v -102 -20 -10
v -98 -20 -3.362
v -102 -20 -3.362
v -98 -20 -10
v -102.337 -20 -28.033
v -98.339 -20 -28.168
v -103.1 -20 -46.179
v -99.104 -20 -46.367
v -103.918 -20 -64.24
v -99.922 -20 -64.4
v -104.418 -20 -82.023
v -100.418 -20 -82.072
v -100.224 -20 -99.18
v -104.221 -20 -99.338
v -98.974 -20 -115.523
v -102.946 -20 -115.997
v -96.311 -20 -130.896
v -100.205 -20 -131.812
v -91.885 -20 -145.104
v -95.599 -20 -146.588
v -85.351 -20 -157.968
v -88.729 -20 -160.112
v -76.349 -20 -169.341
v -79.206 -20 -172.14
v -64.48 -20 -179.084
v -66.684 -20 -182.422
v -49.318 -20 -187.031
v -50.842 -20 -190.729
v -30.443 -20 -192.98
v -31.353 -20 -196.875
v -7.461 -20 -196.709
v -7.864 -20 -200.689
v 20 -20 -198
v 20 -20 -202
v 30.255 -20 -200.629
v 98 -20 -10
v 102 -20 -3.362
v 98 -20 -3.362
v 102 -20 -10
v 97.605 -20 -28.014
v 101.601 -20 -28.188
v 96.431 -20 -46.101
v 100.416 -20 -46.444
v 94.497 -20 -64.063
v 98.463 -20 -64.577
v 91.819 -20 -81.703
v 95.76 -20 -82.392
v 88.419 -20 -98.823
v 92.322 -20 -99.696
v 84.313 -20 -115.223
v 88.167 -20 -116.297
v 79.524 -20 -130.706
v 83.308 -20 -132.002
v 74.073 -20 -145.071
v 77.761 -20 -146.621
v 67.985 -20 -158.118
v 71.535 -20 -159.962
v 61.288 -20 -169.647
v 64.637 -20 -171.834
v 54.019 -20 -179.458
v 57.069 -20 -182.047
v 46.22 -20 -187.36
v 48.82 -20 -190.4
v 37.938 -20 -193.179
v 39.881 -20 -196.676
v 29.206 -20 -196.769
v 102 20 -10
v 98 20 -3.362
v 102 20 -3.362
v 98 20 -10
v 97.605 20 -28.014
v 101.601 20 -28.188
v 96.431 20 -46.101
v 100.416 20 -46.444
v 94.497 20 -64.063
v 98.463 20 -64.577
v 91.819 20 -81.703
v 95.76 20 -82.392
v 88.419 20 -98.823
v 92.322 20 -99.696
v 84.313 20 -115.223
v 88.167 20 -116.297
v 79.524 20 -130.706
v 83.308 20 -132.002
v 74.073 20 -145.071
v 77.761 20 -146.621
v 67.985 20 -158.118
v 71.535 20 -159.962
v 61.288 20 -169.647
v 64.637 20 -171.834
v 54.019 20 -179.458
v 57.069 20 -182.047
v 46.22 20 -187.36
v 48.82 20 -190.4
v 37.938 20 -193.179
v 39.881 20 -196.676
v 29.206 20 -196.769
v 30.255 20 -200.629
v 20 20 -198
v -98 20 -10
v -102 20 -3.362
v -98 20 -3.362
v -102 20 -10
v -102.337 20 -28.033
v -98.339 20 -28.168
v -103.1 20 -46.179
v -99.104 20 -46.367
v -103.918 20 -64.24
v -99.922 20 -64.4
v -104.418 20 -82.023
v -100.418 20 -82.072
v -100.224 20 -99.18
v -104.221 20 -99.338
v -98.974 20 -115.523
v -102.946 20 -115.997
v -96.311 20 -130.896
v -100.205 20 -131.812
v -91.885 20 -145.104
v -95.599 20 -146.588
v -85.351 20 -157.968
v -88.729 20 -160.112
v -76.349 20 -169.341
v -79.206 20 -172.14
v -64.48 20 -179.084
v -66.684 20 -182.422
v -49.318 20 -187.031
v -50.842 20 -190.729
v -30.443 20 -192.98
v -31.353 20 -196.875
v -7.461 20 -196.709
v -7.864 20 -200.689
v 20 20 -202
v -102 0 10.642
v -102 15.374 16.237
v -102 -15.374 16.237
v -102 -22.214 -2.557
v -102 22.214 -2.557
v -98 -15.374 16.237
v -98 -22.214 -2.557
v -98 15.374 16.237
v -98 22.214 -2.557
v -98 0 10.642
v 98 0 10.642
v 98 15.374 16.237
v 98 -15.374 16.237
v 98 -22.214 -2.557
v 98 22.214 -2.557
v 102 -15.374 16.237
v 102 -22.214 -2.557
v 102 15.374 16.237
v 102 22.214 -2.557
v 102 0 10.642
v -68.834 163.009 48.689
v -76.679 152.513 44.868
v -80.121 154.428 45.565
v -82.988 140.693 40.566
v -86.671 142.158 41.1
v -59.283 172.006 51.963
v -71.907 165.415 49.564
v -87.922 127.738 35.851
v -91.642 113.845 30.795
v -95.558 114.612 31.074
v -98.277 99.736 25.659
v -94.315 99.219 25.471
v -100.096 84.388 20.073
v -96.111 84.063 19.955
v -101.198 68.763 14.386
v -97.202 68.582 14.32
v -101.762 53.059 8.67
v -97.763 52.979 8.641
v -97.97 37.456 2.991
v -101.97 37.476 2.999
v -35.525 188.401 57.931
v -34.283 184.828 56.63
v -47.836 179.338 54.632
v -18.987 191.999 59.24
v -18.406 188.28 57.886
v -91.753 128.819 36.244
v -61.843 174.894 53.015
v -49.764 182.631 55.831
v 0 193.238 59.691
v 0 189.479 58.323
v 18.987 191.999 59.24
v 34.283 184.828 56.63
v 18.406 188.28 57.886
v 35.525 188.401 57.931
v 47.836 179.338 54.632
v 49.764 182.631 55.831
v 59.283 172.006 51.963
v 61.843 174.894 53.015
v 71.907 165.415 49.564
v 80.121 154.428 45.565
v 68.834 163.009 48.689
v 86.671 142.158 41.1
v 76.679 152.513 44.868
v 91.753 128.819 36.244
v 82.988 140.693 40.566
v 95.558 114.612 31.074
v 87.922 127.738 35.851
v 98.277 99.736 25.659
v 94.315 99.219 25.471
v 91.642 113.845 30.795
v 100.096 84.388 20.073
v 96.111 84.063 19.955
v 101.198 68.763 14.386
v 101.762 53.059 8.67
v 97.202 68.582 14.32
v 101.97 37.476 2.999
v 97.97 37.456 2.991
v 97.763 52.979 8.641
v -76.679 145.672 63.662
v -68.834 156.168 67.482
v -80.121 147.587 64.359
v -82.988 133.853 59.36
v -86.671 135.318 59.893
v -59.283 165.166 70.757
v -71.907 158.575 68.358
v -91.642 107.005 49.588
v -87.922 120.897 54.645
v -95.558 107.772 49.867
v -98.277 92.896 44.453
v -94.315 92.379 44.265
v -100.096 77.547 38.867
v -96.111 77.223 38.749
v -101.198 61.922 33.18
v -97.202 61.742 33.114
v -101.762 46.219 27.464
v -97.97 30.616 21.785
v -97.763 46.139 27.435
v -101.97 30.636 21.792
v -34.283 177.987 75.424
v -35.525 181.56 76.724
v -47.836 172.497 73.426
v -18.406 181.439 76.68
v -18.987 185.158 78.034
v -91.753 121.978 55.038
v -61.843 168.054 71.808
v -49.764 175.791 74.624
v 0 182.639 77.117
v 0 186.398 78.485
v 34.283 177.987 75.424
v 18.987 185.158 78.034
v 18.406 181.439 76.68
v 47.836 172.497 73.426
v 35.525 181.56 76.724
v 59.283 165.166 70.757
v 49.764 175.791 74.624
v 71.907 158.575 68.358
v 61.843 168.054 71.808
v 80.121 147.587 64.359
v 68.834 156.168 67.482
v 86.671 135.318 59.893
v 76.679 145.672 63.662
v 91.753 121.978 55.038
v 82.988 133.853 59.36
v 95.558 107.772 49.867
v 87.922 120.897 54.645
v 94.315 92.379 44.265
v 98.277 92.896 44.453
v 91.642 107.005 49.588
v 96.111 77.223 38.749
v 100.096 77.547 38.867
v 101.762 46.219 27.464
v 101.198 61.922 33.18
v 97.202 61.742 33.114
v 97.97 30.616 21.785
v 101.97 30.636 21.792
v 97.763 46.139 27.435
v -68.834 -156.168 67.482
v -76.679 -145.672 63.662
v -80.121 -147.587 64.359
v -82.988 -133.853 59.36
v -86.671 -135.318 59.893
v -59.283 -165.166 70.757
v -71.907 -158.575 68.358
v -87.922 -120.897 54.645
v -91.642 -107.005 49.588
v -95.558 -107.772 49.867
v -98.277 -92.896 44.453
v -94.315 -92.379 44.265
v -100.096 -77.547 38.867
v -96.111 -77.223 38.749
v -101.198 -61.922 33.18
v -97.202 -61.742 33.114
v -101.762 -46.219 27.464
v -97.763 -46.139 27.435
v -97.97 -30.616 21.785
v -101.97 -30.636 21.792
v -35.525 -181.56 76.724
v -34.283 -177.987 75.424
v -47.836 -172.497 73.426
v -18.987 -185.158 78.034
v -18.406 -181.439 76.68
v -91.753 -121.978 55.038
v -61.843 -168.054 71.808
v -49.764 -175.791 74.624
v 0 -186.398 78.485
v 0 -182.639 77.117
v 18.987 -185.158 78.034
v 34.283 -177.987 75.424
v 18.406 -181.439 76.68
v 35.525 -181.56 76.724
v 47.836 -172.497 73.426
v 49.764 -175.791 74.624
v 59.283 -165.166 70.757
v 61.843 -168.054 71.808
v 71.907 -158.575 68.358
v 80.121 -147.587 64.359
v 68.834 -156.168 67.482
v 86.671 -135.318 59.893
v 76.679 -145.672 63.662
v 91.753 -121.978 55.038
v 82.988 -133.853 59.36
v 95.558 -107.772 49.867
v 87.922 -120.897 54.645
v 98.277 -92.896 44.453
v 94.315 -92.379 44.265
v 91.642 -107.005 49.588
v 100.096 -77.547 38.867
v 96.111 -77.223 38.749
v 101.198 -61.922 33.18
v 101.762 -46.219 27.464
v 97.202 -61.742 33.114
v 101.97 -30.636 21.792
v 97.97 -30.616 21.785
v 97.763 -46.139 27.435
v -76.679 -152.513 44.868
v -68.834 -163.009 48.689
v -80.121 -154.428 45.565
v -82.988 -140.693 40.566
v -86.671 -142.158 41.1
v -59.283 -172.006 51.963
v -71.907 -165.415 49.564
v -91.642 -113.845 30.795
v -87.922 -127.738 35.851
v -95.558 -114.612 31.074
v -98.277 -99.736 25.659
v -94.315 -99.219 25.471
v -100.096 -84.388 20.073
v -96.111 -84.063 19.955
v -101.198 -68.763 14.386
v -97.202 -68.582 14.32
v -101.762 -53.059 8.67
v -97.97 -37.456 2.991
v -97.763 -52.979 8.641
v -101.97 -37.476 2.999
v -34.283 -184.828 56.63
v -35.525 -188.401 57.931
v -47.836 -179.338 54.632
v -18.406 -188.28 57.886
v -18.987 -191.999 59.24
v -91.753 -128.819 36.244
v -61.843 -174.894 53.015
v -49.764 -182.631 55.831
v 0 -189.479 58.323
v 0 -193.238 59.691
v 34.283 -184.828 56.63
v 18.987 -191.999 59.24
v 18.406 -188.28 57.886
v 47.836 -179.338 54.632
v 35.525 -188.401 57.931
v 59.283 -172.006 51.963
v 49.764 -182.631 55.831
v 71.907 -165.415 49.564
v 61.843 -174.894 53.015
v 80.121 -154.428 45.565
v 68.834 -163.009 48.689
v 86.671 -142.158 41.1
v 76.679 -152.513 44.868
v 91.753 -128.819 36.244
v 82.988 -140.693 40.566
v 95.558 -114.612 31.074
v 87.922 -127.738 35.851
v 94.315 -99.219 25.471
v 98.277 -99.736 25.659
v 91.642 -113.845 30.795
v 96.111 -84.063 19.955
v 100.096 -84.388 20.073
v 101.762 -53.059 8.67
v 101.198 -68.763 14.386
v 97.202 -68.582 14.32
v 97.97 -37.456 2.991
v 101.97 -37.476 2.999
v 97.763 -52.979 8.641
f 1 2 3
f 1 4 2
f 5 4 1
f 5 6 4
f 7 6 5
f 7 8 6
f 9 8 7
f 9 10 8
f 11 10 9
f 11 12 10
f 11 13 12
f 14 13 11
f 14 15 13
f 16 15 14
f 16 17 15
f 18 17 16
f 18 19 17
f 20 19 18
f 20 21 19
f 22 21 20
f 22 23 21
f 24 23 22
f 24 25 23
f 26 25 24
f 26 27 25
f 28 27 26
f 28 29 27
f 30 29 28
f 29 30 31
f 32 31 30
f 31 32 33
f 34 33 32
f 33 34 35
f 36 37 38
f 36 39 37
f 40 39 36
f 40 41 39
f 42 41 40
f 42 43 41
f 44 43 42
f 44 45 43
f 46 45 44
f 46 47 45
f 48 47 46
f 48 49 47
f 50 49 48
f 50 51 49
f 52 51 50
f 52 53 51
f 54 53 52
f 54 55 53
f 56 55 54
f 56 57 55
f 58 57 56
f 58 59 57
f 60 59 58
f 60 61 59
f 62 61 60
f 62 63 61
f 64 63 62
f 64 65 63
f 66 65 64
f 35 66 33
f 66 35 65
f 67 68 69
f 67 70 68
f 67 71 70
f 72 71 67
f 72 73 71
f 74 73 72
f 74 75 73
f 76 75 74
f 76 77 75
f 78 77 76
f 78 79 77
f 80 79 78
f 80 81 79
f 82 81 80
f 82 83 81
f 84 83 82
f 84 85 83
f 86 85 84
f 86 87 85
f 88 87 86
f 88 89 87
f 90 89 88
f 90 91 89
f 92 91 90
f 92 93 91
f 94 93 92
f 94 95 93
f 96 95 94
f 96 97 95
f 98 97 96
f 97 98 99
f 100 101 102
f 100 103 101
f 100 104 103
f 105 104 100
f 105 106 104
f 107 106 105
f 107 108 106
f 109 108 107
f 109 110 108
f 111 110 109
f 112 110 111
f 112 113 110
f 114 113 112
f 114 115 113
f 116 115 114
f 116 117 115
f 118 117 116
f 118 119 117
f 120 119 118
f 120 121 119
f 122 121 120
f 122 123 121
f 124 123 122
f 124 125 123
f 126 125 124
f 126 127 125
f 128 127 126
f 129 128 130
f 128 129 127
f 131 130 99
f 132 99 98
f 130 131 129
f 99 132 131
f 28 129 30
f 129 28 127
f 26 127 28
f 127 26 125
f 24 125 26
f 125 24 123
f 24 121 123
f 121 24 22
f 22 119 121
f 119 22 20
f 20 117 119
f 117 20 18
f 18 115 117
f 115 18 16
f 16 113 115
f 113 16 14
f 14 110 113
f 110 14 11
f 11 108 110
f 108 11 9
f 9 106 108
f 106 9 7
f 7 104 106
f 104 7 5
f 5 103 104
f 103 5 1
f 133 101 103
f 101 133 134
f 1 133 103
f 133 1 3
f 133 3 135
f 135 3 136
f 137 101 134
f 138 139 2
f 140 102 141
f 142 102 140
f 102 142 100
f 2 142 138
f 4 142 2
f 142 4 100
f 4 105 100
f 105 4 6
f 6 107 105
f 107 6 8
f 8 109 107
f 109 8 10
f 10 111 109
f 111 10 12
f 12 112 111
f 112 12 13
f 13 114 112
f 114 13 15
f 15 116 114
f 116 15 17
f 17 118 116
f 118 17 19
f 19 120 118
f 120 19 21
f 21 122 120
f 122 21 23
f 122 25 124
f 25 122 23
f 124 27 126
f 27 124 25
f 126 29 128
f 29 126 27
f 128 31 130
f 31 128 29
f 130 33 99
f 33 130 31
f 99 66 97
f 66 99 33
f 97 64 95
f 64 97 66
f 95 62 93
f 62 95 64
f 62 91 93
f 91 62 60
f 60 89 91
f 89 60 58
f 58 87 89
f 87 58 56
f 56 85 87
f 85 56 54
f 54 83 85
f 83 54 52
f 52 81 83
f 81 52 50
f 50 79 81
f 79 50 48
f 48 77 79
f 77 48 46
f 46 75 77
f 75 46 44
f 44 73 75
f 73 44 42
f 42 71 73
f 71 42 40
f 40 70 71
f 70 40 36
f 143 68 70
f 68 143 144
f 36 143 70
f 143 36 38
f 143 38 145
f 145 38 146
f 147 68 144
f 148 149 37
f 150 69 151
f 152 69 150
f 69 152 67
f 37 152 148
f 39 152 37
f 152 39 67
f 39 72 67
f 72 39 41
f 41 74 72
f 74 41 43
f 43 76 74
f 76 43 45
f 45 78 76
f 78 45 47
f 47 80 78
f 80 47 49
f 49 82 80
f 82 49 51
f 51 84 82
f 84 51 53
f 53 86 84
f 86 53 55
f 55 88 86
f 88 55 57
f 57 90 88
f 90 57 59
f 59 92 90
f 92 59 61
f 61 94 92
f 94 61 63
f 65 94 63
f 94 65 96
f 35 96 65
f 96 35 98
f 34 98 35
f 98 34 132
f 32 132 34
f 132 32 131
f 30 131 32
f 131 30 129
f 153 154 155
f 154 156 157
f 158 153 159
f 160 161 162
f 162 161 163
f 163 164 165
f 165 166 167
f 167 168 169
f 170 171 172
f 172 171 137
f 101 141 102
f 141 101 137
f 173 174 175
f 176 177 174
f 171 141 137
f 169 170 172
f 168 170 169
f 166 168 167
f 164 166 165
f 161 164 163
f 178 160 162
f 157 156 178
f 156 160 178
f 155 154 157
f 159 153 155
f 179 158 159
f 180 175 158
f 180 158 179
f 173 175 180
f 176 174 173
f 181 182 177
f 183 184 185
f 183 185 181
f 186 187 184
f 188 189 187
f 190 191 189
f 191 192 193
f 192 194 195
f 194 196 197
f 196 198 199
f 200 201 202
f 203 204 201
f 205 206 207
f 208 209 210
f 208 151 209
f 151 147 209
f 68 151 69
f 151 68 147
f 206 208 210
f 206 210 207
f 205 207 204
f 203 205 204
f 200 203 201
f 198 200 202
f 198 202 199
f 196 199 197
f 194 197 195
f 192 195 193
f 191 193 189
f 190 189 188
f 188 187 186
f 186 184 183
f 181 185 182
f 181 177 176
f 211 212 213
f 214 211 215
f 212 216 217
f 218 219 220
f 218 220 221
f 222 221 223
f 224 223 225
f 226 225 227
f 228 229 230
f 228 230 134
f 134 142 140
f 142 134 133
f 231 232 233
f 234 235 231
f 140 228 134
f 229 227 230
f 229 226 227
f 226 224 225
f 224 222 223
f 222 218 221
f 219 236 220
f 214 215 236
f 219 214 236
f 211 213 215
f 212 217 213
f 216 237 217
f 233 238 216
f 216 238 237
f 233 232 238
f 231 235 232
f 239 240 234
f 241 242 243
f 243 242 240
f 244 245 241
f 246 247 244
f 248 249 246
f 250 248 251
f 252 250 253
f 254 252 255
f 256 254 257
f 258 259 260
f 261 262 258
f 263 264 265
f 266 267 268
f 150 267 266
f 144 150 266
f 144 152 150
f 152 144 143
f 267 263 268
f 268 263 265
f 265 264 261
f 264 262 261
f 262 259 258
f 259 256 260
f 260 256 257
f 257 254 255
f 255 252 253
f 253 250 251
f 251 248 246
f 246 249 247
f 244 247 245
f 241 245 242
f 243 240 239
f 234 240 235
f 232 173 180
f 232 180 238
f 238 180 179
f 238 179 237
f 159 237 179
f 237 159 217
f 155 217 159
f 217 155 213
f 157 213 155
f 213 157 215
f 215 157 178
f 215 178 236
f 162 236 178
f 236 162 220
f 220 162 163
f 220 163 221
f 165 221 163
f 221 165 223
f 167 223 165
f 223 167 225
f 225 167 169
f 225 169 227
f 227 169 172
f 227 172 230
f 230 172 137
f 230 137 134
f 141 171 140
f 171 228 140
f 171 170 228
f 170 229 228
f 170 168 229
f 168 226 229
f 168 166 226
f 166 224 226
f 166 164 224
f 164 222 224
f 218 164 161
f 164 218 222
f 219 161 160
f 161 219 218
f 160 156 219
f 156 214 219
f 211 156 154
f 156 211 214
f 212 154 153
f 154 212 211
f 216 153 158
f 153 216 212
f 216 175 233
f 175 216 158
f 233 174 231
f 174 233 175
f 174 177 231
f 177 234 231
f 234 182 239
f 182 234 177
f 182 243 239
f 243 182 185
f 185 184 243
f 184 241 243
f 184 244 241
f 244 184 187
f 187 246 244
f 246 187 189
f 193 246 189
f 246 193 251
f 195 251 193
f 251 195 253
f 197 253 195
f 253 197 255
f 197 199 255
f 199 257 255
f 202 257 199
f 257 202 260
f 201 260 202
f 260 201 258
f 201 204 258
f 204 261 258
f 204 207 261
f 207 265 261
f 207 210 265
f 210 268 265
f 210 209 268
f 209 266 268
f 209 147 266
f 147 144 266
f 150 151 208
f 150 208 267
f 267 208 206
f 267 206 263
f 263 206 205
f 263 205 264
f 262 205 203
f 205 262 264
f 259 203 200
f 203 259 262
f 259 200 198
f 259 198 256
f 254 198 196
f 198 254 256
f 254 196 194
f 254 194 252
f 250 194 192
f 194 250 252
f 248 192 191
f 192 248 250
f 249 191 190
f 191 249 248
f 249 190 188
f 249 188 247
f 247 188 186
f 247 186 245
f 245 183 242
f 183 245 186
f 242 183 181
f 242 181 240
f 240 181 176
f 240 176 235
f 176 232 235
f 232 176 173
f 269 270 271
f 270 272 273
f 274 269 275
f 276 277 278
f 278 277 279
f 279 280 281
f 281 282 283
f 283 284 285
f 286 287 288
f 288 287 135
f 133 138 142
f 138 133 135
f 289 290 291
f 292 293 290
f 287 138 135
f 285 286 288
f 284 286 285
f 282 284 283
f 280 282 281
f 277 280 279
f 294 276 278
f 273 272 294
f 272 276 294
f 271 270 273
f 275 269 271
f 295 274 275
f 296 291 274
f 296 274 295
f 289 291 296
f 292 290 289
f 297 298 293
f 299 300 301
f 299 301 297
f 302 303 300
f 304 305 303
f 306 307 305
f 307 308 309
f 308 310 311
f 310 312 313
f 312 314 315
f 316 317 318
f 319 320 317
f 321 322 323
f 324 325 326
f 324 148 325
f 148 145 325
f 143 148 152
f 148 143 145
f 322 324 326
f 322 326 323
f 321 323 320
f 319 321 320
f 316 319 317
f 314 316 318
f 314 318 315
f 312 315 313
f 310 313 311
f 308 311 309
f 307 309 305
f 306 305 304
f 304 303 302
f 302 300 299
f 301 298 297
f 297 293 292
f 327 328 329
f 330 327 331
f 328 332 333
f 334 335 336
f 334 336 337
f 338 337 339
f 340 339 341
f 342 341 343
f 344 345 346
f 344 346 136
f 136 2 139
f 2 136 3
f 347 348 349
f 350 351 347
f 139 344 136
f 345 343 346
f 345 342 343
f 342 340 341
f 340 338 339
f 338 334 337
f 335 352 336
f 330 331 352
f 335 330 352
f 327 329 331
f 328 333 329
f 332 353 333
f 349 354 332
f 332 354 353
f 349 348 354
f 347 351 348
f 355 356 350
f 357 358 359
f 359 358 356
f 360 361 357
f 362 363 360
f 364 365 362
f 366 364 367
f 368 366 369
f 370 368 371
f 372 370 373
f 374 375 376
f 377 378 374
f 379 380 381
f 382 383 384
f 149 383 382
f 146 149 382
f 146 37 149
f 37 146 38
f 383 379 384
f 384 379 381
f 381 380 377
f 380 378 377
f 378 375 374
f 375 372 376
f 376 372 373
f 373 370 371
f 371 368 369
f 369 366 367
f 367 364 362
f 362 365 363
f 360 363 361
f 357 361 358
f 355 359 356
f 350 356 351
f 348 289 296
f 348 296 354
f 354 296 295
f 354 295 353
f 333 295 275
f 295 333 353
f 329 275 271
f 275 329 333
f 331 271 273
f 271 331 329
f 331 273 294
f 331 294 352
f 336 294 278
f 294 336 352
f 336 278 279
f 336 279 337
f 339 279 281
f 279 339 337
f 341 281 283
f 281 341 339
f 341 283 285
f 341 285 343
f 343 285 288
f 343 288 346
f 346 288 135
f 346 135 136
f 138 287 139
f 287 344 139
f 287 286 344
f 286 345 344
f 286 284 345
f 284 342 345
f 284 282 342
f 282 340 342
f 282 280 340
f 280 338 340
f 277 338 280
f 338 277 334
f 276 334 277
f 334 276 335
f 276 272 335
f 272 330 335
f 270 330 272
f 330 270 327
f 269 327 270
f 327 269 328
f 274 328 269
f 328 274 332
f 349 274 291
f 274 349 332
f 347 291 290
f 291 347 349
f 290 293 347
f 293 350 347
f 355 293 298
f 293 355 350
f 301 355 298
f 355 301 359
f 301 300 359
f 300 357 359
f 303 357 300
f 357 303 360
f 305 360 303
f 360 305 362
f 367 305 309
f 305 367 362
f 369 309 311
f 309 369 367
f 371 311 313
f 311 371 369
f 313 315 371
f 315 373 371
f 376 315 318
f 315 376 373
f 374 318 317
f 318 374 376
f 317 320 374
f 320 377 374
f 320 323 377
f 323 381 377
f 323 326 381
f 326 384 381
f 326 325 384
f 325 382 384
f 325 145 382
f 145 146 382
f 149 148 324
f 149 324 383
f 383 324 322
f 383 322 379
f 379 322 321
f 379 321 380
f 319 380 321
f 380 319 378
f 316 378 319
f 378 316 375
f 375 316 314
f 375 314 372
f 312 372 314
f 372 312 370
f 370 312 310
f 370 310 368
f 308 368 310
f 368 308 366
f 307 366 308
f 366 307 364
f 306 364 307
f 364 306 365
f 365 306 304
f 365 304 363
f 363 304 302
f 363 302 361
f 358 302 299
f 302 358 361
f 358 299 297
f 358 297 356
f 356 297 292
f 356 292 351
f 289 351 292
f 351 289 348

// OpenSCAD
/* [General] */
clearance = 0.5;
distance_front_to_back = 200;
material_thicknesses = 4;
lock_type = "padlock v1"; //[none, padlock v1]
bolt_width = 10;

/* [Waist Band] */
waist_band_distance_center_to_side = 200;
waist_band_angle = 110; //[90:135]
waist_band_width = 20;
waist_band_middle_position = 0.5; //[0:0.01:1]
waist_band_front_curve_factor = 0.5; //[0.01:0.01:2]
waist_band_back_curve_factor = 0.5; //[0:0.01:2]

/* [Crotch Band] */
crotch_band_distance_center_to_bottom = 200;
crotch_band_width = 40;
crotch_band_middle_position = 0.6; //[0:0.01:1]
crotch_band_front_curve_factor = 0.25; //[0.01:0.01:2]
crotch_band_back_curve_factor = 0.75; //[0.01:0.01:2]

/* [Front Modification] */
front_modification = "none"; //[none, male v1, female v1]
front_modification_position = 0.5; //[0:0.01:1]
front_modification_size_1 = 40;
front_modification_size_2 = 40;
front_modification_size_3 = 40;

/* [Back Modification] */
back_modification = "none"; //[none, hole v1]
back_modification_position = 0.5; //[0:0.01:1]
back_modification_size_1 = 40;
back_modification_size_2 = 40;
back_modification_size_3 = 40;

chastity_belt();

module chastity_belt() {
	//front_connector();
	//back_connector();
	rotate([-90,0,0]) crotch_band_raw();
	rotate([waist_band_angle-90,0,0]) waist_band_raw();
	rotate([-waist_band_angle-90,0,0]) waist_band_raw();
}

function 2d_cubic_bezier(p0,p1,p2,p3,fn=15) =
	[for(s=[0:fn]) let(t=s/fn) [for(i=[0,1]) pow(1-t,3)*p0[i]+3*pow(1-t,2)*t*p1[i]+(1-t)*3*pow(t,2)*p2[i]+pow(t,3)*p3[i]]];

function 2d_cubic_bezier_derivation(p0,p1,p2,p3,fn=15) =
	[for(s=[0:fn]) let(t=s/fn) [for(i=[0,1]) 3*pow(1-t,2)*(p1[i]-p0[i])+6*(1-t)*t*(p2[i]-p1[i])+3*pow(t,2)*(p3[i]-p2[i])]];
	
module polygon_cubic_bezier(p0,p1,p2,p3,w,fn=15) {
	c = 2d_cubic_bezier(p0,p1,p2,p3,fn);
	d = 2d_cubic_bezier_derivation(p0,p1,p2,p3,fn);
	polygon(concat(
		[for(s=[0:fn])    [for(i=[0,1]) c[s][i]+w/2*(i?-1:1)*d[s][i?0:1]/sqrt(pow(d[s][0],2)+pow(d[s][1],2))]],
		[for(s=[fn:-1:0]) [for(i=[0,1]) c[s][i]+w/2*(i?1:-1)*d[s][i?0:1]/sqrt(pow(d[s][0],2)+pow(d[s][1],2))]]
	));
}

module crotch_band_raw() {
	middle_position = distance_front_to_back*(crotch_band_middle_position-0.5);
	linear_extrude(crotch_band_width, center=true) {
		translate([-distance_front_to_back/2, waist_band_width/4]) square([material_thicknesses, waist_band_width/2], center=true);
		polygon_cubic_bezier(
			[-distance_front_to_back/2,waist_band_width/2],
			[-distance_front_to_back/2,crotch_band_distance_center_to_bottom/2],
			[middle_position-crotch_band_back_curve_factor*distance_front_to_back,crotch_band_distance_center_to_bottom],
			[middle_position,crotch_band_distance_center_to_bottom],
			material_thicknesses
		);
		polygon_cubic_bezier(
			[middle_position,crotch_band_distance_center_to_bottom],
			[middle_position+crotch_band_front_curve_factor*distance_front_to_back,crotch_band_distance_center_to_bottom],
			[distance_front_to_back/2,crotch_band_distance_center_to_bottom/2],
			[distance_front_to_back/2,waist_band_width/2],
			material_thicknesses
		);
		translate([distance_front_to_back/2, waist_band_width/4]) square([material_thicknesses, waist_band_width/2], center=true);
	}
}

module waist_band_raw() {
	middle_position = distance_front_to_back*(waist_band_middle_position-0.5);
	linear_extrude(waist_band_width, center=true) {
 		translate([-distance_front_to_back/2, crotch_band_width/4]) square([material_thicknesses, crotch_band_width/2], center=true);
		polygon_cubic_bezier(
			[-distance_front_to_back/2,crotch_band_width/2],
			[-distance_front_to_back/2,waist_band_distance_center_to_side/2],
			[middle_position-waist_band_back_curve_factor*distance_front_to_back,waist_band_distance_center_to_side],
			[middle_position,waist_band_distance_center_to_side],
			material_thicknesses
		);
		polygon_cubic_bezier(
			[middle_position,waist_band_distance_center_to_side],
			[middle_position+waist_band_front_curve_factor*distance_front_to_back,waist_band_distance_center_to_side],
			[distance_front_to_back/2,waist_band_distance_center_to_side/2],
			[distance_front_to_back/2,crotch_band_width/2],
			material_thicknesses
		);
		translate([distance_front_to_back/2, crotch_band_width/4]) square([material_thicknesses, crotch_band_width/2], center=true);
	}
}
